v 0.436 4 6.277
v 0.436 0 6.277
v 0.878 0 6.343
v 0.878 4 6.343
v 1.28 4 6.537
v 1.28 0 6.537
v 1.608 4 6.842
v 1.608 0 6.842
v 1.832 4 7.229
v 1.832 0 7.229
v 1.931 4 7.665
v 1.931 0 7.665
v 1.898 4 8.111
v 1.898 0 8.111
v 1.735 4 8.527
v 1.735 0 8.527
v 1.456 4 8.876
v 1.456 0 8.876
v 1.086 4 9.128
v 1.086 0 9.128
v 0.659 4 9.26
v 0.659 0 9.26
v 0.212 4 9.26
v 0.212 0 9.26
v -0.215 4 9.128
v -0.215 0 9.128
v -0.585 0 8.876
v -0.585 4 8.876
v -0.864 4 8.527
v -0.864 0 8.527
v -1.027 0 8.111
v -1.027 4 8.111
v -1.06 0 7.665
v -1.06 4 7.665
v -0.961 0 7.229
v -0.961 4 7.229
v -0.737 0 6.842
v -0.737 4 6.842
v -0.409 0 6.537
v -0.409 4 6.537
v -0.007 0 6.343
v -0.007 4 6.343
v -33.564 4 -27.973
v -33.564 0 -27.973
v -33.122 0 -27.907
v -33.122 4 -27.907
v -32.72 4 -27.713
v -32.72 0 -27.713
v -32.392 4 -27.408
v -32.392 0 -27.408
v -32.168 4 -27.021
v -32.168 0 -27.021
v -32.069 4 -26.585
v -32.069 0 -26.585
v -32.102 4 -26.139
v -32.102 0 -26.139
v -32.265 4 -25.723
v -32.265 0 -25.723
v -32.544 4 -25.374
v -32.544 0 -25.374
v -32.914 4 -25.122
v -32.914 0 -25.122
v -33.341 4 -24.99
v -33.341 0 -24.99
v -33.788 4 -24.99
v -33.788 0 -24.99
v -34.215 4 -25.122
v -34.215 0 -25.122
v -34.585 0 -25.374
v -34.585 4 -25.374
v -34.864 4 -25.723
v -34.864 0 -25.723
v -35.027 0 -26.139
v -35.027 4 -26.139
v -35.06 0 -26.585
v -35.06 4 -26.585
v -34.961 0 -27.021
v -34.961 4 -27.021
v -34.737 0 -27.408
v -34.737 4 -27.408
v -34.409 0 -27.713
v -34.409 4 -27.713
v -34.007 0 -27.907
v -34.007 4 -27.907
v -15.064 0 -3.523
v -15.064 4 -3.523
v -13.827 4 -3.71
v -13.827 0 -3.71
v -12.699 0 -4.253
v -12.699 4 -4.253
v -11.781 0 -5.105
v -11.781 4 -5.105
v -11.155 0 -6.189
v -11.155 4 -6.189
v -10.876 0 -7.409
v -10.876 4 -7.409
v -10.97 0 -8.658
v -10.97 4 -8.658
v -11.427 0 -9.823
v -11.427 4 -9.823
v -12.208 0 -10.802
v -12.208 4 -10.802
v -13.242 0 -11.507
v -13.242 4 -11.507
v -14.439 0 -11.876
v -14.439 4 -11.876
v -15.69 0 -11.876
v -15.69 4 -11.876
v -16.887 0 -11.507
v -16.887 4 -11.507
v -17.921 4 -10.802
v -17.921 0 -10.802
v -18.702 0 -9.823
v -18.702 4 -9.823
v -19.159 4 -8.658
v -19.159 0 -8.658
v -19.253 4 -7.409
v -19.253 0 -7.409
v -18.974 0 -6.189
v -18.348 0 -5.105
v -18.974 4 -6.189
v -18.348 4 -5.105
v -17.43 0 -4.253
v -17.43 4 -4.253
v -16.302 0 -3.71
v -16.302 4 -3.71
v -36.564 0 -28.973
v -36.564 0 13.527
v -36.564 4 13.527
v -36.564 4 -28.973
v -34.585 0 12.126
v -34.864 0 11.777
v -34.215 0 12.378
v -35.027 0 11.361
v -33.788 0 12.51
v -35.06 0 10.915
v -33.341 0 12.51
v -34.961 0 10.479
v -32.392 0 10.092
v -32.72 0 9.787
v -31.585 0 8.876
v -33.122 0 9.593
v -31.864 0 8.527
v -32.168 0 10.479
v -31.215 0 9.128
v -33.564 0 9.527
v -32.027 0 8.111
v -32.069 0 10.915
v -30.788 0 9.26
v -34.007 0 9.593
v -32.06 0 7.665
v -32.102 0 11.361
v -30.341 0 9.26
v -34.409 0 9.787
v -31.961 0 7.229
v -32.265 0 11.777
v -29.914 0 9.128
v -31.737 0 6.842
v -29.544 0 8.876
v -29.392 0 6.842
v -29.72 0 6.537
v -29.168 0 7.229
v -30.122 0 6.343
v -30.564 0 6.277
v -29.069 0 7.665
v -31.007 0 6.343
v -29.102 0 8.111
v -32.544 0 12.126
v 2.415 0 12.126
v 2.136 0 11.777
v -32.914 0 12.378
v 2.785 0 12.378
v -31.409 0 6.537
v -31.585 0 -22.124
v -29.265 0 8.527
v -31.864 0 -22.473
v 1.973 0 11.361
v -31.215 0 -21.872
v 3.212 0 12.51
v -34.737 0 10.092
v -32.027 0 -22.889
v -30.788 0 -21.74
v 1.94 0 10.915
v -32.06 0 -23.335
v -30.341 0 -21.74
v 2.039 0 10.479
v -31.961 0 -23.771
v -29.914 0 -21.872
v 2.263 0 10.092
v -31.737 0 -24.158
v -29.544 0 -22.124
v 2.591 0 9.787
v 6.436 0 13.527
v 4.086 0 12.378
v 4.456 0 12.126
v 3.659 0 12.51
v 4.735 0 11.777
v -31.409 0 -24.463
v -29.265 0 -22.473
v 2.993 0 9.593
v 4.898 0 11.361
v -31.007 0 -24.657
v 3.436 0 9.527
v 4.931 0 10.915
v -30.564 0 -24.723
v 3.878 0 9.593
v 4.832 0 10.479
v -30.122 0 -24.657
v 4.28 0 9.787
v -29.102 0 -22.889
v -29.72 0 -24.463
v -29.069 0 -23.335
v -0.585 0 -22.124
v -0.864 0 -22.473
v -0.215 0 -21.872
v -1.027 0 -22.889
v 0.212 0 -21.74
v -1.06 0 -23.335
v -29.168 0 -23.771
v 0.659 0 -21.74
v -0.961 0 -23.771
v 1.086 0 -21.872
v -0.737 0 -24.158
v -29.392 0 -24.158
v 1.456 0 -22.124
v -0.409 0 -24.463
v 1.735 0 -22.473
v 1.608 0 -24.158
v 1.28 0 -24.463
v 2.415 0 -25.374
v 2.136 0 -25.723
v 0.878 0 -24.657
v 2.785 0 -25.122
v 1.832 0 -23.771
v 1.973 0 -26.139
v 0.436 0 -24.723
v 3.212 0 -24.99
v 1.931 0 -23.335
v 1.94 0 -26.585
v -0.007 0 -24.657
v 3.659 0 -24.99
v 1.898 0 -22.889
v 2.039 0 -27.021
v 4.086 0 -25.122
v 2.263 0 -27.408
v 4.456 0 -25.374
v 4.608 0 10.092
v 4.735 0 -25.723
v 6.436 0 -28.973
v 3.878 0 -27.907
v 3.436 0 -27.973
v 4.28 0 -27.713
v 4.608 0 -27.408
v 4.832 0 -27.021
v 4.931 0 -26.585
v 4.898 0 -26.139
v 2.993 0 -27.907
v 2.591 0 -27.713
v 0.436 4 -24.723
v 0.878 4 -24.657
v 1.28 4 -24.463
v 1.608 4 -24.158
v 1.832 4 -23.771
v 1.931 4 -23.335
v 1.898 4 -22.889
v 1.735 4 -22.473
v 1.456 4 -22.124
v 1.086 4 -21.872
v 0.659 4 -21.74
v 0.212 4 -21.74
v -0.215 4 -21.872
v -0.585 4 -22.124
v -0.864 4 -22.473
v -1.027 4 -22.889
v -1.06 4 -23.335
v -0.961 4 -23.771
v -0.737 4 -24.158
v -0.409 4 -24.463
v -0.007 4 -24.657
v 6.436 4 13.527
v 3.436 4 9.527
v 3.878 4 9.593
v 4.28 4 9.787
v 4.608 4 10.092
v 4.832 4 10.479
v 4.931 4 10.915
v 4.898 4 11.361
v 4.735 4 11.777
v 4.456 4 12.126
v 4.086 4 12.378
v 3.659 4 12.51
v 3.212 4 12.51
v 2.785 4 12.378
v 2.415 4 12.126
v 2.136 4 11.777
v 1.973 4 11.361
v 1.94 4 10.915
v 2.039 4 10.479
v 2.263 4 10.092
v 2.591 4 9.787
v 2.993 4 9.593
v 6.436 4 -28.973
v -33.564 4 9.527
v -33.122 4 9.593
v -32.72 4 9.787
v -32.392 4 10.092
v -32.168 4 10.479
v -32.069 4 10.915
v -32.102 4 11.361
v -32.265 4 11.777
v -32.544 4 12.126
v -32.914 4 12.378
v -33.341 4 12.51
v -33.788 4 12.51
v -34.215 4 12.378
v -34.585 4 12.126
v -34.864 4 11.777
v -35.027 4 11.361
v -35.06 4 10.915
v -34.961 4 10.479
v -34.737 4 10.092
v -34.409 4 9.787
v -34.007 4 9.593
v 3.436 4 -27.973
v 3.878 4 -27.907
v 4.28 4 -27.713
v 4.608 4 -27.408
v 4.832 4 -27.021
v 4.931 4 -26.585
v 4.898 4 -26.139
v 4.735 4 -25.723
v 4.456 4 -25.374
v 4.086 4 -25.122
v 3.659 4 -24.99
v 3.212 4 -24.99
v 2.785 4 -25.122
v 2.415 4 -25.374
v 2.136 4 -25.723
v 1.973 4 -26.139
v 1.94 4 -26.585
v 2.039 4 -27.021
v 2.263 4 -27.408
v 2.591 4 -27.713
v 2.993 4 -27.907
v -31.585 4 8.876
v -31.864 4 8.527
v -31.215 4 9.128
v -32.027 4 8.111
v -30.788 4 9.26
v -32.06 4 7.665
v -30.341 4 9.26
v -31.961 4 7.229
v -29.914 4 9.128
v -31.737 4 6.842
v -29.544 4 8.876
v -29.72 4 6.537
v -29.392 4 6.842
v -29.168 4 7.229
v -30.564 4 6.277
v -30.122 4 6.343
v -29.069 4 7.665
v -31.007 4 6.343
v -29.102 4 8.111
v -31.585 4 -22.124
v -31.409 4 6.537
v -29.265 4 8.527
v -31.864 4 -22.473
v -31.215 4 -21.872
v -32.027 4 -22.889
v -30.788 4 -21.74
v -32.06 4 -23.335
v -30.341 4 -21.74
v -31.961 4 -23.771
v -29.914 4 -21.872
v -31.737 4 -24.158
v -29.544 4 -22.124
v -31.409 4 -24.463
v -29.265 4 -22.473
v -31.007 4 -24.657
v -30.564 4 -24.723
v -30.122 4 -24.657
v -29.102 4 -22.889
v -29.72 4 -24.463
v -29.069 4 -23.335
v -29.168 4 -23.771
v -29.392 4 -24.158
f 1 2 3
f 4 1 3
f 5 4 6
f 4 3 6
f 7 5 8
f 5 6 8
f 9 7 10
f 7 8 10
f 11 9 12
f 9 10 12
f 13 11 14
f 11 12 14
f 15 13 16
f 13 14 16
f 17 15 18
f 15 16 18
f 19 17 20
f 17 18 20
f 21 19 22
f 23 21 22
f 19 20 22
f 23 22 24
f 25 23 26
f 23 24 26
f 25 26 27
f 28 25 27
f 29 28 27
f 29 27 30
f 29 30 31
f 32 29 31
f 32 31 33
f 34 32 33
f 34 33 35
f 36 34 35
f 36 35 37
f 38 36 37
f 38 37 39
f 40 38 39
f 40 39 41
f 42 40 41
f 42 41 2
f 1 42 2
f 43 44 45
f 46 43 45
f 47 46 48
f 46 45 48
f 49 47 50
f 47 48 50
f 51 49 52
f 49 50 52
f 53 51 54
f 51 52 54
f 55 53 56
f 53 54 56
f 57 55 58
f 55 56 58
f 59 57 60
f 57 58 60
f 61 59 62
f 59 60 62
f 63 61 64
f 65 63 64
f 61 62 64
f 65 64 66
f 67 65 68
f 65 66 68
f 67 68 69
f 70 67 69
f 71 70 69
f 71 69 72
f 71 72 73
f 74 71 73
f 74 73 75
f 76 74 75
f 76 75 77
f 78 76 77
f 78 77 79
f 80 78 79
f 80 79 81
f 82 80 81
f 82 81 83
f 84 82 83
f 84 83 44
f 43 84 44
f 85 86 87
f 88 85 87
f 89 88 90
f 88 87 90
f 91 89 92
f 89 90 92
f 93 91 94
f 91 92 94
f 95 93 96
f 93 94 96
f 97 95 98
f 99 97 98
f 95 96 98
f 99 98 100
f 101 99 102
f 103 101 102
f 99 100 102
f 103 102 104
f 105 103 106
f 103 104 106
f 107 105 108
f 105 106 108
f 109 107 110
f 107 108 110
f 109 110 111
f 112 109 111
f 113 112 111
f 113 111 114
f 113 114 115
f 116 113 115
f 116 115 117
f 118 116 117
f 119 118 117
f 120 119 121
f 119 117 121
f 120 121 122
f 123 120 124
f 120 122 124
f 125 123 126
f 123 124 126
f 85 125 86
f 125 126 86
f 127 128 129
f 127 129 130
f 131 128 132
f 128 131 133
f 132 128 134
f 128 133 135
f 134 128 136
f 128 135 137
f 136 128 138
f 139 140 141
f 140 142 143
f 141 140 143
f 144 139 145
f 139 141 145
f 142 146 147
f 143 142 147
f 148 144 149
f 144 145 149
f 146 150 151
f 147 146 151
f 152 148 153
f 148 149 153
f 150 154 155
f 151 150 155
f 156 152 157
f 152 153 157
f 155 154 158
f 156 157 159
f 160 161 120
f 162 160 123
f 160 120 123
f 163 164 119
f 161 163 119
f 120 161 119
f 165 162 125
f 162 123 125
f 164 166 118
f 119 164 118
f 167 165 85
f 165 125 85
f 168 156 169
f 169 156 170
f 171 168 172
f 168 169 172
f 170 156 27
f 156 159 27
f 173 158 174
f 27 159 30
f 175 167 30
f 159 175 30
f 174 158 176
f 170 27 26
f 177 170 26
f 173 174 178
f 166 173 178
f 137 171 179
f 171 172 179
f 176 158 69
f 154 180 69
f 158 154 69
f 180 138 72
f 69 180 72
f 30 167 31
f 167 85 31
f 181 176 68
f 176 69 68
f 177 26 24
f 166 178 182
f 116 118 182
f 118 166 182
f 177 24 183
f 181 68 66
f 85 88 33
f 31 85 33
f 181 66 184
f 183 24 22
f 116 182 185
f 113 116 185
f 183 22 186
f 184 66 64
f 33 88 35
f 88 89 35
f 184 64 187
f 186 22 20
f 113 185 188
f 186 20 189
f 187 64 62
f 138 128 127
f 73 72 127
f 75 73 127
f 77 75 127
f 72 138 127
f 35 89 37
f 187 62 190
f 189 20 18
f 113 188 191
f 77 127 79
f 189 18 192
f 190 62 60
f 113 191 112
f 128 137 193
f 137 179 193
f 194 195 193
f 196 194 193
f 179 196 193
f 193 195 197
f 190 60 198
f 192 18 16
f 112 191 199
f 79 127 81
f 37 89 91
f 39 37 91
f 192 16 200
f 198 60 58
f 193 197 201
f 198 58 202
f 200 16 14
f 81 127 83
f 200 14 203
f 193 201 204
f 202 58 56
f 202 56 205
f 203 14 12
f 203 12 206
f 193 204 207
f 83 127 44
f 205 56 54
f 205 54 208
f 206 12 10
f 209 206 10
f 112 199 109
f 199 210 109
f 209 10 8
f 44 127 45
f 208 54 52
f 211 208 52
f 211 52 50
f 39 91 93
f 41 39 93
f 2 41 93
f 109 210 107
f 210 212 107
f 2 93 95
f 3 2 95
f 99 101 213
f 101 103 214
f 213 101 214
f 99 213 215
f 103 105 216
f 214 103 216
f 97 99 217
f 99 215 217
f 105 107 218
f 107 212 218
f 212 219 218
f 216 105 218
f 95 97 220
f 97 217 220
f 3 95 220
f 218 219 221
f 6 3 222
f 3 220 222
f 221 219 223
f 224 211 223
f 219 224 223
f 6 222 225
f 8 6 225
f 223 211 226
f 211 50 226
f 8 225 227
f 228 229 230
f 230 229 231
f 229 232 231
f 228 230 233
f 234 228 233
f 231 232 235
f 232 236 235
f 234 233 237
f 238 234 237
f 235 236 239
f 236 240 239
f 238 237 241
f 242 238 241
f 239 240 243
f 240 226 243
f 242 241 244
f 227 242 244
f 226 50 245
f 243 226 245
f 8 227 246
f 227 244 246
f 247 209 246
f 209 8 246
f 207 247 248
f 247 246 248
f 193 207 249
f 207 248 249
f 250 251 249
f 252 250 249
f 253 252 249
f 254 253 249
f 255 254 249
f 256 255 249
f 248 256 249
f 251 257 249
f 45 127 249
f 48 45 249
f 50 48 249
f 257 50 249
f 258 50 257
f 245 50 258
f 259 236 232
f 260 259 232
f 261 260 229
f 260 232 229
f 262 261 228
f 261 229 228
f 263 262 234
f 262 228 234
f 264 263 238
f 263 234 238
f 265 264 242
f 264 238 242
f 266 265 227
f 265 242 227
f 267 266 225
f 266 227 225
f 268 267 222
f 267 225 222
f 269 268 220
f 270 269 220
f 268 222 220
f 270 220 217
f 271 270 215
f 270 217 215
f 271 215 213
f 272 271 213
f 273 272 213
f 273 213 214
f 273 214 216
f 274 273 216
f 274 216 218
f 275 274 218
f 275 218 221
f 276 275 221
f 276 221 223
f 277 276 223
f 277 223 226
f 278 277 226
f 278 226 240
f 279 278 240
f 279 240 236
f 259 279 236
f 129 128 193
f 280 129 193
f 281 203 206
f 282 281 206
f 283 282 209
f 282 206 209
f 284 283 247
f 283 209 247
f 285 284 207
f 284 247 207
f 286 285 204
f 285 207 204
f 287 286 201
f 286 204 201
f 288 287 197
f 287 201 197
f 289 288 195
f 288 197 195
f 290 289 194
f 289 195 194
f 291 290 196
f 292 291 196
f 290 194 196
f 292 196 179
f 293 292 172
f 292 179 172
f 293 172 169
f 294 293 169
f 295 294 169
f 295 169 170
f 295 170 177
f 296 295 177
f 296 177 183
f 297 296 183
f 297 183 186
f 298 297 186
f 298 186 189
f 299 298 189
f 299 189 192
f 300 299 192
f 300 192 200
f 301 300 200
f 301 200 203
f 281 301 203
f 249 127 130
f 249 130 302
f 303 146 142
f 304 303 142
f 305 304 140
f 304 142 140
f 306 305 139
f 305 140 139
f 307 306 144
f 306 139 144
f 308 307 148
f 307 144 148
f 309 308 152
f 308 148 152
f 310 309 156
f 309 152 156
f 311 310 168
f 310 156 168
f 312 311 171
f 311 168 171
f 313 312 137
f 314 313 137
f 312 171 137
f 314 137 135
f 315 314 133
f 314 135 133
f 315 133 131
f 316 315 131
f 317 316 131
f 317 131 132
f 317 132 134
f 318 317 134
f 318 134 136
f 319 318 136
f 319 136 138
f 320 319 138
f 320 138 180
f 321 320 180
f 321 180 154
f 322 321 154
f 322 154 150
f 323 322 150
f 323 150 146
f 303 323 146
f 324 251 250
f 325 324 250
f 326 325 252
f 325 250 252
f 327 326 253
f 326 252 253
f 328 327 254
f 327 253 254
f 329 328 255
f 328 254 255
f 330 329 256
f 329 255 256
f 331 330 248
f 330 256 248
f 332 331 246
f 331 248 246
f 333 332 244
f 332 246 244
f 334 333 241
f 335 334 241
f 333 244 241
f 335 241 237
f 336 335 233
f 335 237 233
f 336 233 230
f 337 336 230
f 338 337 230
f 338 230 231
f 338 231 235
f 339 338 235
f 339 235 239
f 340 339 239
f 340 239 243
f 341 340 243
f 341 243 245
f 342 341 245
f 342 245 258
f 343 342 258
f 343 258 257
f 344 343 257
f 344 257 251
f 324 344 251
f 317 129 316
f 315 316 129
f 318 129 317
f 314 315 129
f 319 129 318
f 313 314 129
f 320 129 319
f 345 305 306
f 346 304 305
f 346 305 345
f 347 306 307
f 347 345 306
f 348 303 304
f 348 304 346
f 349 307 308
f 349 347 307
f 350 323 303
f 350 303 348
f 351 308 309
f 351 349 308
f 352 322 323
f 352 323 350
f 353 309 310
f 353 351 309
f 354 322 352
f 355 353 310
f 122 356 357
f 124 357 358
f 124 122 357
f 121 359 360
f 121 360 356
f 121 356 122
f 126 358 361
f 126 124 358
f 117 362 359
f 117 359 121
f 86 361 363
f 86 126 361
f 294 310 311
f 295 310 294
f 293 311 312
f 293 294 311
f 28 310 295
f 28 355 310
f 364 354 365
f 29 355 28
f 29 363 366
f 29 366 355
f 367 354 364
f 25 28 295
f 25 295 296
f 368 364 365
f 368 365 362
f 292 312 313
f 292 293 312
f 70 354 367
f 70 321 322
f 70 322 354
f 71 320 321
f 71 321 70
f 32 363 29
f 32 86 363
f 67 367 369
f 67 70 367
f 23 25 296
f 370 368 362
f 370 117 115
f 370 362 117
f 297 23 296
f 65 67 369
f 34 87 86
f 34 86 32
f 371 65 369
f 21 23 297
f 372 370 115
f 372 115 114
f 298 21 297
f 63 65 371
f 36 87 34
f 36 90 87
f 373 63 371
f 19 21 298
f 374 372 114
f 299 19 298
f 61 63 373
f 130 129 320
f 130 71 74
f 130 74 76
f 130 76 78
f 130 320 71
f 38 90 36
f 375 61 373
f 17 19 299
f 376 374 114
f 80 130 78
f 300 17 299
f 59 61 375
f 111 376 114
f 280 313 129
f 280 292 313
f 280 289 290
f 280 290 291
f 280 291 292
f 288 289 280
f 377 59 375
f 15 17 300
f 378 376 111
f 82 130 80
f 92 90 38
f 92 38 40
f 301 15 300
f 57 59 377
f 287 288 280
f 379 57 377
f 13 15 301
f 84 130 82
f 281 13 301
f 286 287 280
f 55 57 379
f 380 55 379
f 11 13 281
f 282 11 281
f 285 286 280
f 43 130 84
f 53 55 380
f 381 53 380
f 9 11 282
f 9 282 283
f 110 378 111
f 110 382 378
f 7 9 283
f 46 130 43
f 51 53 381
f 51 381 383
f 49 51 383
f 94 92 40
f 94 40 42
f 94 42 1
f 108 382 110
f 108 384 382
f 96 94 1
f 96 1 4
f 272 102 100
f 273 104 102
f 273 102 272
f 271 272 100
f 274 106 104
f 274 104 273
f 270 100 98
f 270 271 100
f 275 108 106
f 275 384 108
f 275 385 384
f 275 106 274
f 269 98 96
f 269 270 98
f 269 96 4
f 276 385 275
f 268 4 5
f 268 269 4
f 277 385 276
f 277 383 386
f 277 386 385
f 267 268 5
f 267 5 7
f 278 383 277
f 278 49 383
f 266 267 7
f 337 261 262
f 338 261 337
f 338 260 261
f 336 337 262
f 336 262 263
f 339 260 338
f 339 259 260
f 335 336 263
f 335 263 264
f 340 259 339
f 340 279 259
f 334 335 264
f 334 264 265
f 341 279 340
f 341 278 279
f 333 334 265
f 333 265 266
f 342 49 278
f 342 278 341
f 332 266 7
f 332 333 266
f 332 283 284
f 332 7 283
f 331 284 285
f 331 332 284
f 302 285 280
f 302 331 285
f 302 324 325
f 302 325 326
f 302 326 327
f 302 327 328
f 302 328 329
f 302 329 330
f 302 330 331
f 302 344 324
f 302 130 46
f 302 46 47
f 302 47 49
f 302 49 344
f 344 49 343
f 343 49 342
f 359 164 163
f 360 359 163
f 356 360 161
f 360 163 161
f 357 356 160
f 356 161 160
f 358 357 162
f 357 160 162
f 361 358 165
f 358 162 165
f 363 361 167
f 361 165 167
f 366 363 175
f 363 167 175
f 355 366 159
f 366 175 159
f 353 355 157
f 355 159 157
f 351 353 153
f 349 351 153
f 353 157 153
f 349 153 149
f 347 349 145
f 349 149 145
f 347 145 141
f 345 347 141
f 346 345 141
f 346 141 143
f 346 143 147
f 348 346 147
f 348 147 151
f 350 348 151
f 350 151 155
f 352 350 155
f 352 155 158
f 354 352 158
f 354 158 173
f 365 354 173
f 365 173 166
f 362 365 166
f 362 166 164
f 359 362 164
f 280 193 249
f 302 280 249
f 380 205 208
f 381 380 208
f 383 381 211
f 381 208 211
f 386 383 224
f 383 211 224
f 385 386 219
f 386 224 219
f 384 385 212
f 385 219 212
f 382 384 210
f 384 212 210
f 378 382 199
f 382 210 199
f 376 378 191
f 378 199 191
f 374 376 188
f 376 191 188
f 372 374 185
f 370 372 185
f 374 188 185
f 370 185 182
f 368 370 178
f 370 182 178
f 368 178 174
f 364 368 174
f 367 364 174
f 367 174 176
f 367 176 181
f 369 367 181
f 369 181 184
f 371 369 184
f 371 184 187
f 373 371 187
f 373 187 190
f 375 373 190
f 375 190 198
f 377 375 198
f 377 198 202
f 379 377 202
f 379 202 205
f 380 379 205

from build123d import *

# Parameters (mm, degrees)
SKETCH_1_W          = 43
SKETCH_1_H          = 42.5
EXTRUDE_1_DEPTH     = 4
SKETCH_2_R          = 1.5
CUT_EXTRUDE_1_DEPTH = 10
SKETCH_3_R          = 1.5
CUT_EXTRUDE_2_DEPTH = 10
SKETCH_4_R          = 4.2
CUT_EXTRUDE_3_DEPTH = 4


with BuildPart() as part:
    # Эскиз1 → Бобышка-Вытянуть1 (new body)
    with BuildSketch(Plane(origin=(0, 0, 0), x_dir=(1, 0, 0), z_dir=(0, 1, 0))):
        with Locations((-15.064488683, 7.723245358)):
            Rectangle(SKETCH_1_W, SKETCH_1_H)
    extrude(amount=EXTRUDE_1_DEPTH)

    # Эскиз2 → Вырез-Вытянуть1 (cut)
    with BuildSketch(Plane.XZ):
        with Locations(Location((-33.564488683, 11.026754642, 0), (0, 0, 270))):
            Circle(SKETCH_2_R)
        with Locations(Location((3.435511317, 11.026754642, 0), (0, 0, 270))):
            Circle(SKETCH_2_R)
        with Locations(Location((-33.564488683, -26.473245358, 0), (0, 0, 270))):
            Circle(SKETCH_2_R)
        with Locations(Location((3.435511317, -26.473245358, 0), (0, 0, 270))):
            Circle(SKETCH_2_R)
    extrude(amount=-CUT_EXTRUDE_1_DEPTH, mode=Mode.SUBTRACT)

    # Эскиз3 → Вырез-Вытянуть2 (cut)
    with BuildSketch(Plane.XZ):
        with Locations(Location((-30.564488683, 7.776754642, 0), (0, 0, 270))):
            Circle(SKETCH_3_R)
        with Locations(Location((-30.564488683, -23.223245358, 0), (0, 0, 270))):
            Circle(SKETCH_3_R)
        with Locations(Location((0.435511317, 7.776754642, 0), (0, 0, 270))):
            Circle(SKETCH_3_R)
        with Locations(Location((0.435511317, -23.223245358, 0), (0, 0, 270))):
            Circle(SKETCH_3_R)
    extrude(amount=-CUT_EXTRUDE_2_DEPTH, mode=Mode.SUBTRACT)

    # Эскиз4 → Вырез-Вытянуть3 (cut)
    with BuildSketch(Plane(origin=(0, 4, 0), x_dir=(1, 0, 0), z_dir=(0, 1, 0))):
        with Locations(Location((-15.064488683, 7.723245358, 0), (0, 0, 270))):
            Circle(SKETCH_4_R)
    extrude(amount=-CUT_EXTRUDE_3_DEPTH, mode=Mode.SUBTRACT)


solid = part.part
